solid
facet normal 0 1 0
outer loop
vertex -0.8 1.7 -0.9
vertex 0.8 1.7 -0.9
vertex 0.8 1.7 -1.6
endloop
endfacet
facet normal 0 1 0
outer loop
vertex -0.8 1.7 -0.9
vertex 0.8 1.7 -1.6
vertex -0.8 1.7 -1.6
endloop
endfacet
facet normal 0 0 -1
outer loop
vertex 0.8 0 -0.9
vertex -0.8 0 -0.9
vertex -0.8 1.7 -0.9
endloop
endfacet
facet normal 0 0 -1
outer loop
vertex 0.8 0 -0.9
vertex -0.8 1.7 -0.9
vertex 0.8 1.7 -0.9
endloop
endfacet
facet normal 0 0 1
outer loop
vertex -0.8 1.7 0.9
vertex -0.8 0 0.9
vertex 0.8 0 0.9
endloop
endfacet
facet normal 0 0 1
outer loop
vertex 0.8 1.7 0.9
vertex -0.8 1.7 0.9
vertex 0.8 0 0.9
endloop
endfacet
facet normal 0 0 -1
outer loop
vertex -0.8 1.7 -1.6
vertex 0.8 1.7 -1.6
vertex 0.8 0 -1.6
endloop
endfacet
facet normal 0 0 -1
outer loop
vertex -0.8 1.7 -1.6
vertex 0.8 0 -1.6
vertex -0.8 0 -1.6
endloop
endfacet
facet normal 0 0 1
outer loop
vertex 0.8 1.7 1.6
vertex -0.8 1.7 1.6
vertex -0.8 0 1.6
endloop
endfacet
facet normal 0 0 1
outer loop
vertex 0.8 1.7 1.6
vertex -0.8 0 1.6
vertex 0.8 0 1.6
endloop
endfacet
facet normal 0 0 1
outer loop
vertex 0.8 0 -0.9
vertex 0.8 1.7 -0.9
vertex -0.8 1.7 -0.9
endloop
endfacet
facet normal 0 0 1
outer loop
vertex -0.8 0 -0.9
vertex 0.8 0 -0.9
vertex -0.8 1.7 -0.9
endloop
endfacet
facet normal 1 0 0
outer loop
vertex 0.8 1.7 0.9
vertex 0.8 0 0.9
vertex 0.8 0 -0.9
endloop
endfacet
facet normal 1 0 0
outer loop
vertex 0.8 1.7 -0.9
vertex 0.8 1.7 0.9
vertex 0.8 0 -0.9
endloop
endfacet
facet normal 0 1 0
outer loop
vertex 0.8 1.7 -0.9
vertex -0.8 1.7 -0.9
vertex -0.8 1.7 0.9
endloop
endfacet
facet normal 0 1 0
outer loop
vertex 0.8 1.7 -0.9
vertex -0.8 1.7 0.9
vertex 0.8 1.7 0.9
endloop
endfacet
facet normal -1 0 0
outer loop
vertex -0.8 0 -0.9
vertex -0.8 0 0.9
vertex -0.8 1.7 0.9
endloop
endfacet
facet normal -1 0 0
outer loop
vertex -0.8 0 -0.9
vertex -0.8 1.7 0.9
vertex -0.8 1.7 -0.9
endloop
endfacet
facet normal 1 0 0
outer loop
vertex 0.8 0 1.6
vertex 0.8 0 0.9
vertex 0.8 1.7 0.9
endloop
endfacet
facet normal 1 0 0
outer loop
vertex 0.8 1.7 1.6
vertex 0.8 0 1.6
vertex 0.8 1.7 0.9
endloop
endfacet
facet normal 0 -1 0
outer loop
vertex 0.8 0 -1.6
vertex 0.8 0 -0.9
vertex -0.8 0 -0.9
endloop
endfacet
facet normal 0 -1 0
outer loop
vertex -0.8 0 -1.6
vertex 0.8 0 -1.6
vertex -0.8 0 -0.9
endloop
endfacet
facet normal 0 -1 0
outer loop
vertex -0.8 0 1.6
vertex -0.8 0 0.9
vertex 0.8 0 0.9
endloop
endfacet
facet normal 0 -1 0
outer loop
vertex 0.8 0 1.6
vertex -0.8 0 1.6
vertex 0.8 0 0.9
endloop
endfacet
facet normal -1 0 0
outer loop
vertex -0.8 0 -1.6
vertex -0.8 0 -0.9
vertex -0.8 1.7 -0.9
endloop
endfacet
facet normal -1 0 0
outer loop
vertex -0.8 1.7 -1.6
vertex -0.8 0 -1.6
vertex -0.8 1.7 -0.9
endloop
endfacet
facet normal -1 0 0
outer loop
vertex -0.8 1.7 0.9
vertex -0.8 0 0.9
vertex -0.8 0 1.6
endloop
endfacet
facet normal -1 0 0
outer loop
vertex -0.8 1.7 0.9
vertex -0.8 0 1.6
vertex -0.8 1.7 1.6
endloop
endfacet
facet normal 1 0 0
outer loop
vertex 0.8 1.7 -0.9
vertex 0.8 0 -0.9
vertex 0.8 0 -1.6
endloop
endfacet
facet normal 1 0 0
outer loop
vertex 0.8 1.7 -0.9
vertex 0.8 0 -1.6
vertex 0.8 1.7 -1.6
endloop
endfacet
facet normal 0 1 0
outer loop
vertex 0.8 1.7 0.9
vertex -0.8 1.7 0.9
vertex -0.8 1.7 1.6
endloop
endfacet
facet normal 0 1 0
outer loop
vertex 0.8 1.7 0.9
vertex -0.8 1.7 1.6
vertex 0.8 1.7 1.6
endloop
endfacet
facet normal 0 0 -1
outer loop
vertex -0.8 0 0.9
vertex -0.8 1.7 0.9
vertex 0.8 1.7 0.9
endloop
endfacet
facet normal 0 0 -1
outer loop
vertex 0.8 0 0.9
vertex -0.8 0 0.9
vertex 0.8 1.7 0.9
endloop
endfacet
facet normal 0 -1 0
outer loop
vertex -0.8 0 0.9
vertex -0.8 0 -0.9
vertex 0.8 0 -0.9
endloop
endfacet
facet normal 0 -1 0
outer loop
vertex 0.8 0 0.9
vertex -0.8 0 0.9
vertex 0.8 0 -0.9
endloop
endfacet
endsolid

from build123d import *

# Parameters (mm, degrees)
SKETCH1_W  = 1.6
SKETCH1_H  = 1.8
MB_DEPTH   = 1.7
SKETCH2_W  = 1.6
SKETCH2_H  = 1.7
SB_L_DEPTH = 0.7
SKETCH3_W  = 1.6
SKETCH3_H  = 1.7
SB_R_DEPTH = 0.7


with BuildPart() as part:
    # Sketch1 → MB (new body)
    with BuildSketch(Plane(origin=(0, 0, 0), x_dir=(1, 0, 0), z_dir=(0, 1, 0))):
        Rectangle(SKETCH1_W, SKETCH1_H)
    extrude(amount=MB_DEPTH)


with BuildPart() as body_2:
    # Sketch2 → SB L (new body)
    with BuildSketch(Plane.XY.offset(0.9)):
        with Locations((0, 0.85)):
            Rectangle(SKETCH2_W, SKETCH2_H)
    extrude(amount=SB_L_DEPTH)


with BuildPart() as body_3:
    # Sketch3 → SB R (new body)
    with BuildSketch(Plane(origin=(0, 0, -0.9), x_dir=(-1, 0, 0), z_dir=(0, 0, -1))):
        with Locations((0, 0.85)):
            Rectangle(SKETCH3_W, SKETCH3_H)
    extrude(amount=SB_R_DEPTH)


solid = Compound([part.part, body_2.part, body_3.part])
